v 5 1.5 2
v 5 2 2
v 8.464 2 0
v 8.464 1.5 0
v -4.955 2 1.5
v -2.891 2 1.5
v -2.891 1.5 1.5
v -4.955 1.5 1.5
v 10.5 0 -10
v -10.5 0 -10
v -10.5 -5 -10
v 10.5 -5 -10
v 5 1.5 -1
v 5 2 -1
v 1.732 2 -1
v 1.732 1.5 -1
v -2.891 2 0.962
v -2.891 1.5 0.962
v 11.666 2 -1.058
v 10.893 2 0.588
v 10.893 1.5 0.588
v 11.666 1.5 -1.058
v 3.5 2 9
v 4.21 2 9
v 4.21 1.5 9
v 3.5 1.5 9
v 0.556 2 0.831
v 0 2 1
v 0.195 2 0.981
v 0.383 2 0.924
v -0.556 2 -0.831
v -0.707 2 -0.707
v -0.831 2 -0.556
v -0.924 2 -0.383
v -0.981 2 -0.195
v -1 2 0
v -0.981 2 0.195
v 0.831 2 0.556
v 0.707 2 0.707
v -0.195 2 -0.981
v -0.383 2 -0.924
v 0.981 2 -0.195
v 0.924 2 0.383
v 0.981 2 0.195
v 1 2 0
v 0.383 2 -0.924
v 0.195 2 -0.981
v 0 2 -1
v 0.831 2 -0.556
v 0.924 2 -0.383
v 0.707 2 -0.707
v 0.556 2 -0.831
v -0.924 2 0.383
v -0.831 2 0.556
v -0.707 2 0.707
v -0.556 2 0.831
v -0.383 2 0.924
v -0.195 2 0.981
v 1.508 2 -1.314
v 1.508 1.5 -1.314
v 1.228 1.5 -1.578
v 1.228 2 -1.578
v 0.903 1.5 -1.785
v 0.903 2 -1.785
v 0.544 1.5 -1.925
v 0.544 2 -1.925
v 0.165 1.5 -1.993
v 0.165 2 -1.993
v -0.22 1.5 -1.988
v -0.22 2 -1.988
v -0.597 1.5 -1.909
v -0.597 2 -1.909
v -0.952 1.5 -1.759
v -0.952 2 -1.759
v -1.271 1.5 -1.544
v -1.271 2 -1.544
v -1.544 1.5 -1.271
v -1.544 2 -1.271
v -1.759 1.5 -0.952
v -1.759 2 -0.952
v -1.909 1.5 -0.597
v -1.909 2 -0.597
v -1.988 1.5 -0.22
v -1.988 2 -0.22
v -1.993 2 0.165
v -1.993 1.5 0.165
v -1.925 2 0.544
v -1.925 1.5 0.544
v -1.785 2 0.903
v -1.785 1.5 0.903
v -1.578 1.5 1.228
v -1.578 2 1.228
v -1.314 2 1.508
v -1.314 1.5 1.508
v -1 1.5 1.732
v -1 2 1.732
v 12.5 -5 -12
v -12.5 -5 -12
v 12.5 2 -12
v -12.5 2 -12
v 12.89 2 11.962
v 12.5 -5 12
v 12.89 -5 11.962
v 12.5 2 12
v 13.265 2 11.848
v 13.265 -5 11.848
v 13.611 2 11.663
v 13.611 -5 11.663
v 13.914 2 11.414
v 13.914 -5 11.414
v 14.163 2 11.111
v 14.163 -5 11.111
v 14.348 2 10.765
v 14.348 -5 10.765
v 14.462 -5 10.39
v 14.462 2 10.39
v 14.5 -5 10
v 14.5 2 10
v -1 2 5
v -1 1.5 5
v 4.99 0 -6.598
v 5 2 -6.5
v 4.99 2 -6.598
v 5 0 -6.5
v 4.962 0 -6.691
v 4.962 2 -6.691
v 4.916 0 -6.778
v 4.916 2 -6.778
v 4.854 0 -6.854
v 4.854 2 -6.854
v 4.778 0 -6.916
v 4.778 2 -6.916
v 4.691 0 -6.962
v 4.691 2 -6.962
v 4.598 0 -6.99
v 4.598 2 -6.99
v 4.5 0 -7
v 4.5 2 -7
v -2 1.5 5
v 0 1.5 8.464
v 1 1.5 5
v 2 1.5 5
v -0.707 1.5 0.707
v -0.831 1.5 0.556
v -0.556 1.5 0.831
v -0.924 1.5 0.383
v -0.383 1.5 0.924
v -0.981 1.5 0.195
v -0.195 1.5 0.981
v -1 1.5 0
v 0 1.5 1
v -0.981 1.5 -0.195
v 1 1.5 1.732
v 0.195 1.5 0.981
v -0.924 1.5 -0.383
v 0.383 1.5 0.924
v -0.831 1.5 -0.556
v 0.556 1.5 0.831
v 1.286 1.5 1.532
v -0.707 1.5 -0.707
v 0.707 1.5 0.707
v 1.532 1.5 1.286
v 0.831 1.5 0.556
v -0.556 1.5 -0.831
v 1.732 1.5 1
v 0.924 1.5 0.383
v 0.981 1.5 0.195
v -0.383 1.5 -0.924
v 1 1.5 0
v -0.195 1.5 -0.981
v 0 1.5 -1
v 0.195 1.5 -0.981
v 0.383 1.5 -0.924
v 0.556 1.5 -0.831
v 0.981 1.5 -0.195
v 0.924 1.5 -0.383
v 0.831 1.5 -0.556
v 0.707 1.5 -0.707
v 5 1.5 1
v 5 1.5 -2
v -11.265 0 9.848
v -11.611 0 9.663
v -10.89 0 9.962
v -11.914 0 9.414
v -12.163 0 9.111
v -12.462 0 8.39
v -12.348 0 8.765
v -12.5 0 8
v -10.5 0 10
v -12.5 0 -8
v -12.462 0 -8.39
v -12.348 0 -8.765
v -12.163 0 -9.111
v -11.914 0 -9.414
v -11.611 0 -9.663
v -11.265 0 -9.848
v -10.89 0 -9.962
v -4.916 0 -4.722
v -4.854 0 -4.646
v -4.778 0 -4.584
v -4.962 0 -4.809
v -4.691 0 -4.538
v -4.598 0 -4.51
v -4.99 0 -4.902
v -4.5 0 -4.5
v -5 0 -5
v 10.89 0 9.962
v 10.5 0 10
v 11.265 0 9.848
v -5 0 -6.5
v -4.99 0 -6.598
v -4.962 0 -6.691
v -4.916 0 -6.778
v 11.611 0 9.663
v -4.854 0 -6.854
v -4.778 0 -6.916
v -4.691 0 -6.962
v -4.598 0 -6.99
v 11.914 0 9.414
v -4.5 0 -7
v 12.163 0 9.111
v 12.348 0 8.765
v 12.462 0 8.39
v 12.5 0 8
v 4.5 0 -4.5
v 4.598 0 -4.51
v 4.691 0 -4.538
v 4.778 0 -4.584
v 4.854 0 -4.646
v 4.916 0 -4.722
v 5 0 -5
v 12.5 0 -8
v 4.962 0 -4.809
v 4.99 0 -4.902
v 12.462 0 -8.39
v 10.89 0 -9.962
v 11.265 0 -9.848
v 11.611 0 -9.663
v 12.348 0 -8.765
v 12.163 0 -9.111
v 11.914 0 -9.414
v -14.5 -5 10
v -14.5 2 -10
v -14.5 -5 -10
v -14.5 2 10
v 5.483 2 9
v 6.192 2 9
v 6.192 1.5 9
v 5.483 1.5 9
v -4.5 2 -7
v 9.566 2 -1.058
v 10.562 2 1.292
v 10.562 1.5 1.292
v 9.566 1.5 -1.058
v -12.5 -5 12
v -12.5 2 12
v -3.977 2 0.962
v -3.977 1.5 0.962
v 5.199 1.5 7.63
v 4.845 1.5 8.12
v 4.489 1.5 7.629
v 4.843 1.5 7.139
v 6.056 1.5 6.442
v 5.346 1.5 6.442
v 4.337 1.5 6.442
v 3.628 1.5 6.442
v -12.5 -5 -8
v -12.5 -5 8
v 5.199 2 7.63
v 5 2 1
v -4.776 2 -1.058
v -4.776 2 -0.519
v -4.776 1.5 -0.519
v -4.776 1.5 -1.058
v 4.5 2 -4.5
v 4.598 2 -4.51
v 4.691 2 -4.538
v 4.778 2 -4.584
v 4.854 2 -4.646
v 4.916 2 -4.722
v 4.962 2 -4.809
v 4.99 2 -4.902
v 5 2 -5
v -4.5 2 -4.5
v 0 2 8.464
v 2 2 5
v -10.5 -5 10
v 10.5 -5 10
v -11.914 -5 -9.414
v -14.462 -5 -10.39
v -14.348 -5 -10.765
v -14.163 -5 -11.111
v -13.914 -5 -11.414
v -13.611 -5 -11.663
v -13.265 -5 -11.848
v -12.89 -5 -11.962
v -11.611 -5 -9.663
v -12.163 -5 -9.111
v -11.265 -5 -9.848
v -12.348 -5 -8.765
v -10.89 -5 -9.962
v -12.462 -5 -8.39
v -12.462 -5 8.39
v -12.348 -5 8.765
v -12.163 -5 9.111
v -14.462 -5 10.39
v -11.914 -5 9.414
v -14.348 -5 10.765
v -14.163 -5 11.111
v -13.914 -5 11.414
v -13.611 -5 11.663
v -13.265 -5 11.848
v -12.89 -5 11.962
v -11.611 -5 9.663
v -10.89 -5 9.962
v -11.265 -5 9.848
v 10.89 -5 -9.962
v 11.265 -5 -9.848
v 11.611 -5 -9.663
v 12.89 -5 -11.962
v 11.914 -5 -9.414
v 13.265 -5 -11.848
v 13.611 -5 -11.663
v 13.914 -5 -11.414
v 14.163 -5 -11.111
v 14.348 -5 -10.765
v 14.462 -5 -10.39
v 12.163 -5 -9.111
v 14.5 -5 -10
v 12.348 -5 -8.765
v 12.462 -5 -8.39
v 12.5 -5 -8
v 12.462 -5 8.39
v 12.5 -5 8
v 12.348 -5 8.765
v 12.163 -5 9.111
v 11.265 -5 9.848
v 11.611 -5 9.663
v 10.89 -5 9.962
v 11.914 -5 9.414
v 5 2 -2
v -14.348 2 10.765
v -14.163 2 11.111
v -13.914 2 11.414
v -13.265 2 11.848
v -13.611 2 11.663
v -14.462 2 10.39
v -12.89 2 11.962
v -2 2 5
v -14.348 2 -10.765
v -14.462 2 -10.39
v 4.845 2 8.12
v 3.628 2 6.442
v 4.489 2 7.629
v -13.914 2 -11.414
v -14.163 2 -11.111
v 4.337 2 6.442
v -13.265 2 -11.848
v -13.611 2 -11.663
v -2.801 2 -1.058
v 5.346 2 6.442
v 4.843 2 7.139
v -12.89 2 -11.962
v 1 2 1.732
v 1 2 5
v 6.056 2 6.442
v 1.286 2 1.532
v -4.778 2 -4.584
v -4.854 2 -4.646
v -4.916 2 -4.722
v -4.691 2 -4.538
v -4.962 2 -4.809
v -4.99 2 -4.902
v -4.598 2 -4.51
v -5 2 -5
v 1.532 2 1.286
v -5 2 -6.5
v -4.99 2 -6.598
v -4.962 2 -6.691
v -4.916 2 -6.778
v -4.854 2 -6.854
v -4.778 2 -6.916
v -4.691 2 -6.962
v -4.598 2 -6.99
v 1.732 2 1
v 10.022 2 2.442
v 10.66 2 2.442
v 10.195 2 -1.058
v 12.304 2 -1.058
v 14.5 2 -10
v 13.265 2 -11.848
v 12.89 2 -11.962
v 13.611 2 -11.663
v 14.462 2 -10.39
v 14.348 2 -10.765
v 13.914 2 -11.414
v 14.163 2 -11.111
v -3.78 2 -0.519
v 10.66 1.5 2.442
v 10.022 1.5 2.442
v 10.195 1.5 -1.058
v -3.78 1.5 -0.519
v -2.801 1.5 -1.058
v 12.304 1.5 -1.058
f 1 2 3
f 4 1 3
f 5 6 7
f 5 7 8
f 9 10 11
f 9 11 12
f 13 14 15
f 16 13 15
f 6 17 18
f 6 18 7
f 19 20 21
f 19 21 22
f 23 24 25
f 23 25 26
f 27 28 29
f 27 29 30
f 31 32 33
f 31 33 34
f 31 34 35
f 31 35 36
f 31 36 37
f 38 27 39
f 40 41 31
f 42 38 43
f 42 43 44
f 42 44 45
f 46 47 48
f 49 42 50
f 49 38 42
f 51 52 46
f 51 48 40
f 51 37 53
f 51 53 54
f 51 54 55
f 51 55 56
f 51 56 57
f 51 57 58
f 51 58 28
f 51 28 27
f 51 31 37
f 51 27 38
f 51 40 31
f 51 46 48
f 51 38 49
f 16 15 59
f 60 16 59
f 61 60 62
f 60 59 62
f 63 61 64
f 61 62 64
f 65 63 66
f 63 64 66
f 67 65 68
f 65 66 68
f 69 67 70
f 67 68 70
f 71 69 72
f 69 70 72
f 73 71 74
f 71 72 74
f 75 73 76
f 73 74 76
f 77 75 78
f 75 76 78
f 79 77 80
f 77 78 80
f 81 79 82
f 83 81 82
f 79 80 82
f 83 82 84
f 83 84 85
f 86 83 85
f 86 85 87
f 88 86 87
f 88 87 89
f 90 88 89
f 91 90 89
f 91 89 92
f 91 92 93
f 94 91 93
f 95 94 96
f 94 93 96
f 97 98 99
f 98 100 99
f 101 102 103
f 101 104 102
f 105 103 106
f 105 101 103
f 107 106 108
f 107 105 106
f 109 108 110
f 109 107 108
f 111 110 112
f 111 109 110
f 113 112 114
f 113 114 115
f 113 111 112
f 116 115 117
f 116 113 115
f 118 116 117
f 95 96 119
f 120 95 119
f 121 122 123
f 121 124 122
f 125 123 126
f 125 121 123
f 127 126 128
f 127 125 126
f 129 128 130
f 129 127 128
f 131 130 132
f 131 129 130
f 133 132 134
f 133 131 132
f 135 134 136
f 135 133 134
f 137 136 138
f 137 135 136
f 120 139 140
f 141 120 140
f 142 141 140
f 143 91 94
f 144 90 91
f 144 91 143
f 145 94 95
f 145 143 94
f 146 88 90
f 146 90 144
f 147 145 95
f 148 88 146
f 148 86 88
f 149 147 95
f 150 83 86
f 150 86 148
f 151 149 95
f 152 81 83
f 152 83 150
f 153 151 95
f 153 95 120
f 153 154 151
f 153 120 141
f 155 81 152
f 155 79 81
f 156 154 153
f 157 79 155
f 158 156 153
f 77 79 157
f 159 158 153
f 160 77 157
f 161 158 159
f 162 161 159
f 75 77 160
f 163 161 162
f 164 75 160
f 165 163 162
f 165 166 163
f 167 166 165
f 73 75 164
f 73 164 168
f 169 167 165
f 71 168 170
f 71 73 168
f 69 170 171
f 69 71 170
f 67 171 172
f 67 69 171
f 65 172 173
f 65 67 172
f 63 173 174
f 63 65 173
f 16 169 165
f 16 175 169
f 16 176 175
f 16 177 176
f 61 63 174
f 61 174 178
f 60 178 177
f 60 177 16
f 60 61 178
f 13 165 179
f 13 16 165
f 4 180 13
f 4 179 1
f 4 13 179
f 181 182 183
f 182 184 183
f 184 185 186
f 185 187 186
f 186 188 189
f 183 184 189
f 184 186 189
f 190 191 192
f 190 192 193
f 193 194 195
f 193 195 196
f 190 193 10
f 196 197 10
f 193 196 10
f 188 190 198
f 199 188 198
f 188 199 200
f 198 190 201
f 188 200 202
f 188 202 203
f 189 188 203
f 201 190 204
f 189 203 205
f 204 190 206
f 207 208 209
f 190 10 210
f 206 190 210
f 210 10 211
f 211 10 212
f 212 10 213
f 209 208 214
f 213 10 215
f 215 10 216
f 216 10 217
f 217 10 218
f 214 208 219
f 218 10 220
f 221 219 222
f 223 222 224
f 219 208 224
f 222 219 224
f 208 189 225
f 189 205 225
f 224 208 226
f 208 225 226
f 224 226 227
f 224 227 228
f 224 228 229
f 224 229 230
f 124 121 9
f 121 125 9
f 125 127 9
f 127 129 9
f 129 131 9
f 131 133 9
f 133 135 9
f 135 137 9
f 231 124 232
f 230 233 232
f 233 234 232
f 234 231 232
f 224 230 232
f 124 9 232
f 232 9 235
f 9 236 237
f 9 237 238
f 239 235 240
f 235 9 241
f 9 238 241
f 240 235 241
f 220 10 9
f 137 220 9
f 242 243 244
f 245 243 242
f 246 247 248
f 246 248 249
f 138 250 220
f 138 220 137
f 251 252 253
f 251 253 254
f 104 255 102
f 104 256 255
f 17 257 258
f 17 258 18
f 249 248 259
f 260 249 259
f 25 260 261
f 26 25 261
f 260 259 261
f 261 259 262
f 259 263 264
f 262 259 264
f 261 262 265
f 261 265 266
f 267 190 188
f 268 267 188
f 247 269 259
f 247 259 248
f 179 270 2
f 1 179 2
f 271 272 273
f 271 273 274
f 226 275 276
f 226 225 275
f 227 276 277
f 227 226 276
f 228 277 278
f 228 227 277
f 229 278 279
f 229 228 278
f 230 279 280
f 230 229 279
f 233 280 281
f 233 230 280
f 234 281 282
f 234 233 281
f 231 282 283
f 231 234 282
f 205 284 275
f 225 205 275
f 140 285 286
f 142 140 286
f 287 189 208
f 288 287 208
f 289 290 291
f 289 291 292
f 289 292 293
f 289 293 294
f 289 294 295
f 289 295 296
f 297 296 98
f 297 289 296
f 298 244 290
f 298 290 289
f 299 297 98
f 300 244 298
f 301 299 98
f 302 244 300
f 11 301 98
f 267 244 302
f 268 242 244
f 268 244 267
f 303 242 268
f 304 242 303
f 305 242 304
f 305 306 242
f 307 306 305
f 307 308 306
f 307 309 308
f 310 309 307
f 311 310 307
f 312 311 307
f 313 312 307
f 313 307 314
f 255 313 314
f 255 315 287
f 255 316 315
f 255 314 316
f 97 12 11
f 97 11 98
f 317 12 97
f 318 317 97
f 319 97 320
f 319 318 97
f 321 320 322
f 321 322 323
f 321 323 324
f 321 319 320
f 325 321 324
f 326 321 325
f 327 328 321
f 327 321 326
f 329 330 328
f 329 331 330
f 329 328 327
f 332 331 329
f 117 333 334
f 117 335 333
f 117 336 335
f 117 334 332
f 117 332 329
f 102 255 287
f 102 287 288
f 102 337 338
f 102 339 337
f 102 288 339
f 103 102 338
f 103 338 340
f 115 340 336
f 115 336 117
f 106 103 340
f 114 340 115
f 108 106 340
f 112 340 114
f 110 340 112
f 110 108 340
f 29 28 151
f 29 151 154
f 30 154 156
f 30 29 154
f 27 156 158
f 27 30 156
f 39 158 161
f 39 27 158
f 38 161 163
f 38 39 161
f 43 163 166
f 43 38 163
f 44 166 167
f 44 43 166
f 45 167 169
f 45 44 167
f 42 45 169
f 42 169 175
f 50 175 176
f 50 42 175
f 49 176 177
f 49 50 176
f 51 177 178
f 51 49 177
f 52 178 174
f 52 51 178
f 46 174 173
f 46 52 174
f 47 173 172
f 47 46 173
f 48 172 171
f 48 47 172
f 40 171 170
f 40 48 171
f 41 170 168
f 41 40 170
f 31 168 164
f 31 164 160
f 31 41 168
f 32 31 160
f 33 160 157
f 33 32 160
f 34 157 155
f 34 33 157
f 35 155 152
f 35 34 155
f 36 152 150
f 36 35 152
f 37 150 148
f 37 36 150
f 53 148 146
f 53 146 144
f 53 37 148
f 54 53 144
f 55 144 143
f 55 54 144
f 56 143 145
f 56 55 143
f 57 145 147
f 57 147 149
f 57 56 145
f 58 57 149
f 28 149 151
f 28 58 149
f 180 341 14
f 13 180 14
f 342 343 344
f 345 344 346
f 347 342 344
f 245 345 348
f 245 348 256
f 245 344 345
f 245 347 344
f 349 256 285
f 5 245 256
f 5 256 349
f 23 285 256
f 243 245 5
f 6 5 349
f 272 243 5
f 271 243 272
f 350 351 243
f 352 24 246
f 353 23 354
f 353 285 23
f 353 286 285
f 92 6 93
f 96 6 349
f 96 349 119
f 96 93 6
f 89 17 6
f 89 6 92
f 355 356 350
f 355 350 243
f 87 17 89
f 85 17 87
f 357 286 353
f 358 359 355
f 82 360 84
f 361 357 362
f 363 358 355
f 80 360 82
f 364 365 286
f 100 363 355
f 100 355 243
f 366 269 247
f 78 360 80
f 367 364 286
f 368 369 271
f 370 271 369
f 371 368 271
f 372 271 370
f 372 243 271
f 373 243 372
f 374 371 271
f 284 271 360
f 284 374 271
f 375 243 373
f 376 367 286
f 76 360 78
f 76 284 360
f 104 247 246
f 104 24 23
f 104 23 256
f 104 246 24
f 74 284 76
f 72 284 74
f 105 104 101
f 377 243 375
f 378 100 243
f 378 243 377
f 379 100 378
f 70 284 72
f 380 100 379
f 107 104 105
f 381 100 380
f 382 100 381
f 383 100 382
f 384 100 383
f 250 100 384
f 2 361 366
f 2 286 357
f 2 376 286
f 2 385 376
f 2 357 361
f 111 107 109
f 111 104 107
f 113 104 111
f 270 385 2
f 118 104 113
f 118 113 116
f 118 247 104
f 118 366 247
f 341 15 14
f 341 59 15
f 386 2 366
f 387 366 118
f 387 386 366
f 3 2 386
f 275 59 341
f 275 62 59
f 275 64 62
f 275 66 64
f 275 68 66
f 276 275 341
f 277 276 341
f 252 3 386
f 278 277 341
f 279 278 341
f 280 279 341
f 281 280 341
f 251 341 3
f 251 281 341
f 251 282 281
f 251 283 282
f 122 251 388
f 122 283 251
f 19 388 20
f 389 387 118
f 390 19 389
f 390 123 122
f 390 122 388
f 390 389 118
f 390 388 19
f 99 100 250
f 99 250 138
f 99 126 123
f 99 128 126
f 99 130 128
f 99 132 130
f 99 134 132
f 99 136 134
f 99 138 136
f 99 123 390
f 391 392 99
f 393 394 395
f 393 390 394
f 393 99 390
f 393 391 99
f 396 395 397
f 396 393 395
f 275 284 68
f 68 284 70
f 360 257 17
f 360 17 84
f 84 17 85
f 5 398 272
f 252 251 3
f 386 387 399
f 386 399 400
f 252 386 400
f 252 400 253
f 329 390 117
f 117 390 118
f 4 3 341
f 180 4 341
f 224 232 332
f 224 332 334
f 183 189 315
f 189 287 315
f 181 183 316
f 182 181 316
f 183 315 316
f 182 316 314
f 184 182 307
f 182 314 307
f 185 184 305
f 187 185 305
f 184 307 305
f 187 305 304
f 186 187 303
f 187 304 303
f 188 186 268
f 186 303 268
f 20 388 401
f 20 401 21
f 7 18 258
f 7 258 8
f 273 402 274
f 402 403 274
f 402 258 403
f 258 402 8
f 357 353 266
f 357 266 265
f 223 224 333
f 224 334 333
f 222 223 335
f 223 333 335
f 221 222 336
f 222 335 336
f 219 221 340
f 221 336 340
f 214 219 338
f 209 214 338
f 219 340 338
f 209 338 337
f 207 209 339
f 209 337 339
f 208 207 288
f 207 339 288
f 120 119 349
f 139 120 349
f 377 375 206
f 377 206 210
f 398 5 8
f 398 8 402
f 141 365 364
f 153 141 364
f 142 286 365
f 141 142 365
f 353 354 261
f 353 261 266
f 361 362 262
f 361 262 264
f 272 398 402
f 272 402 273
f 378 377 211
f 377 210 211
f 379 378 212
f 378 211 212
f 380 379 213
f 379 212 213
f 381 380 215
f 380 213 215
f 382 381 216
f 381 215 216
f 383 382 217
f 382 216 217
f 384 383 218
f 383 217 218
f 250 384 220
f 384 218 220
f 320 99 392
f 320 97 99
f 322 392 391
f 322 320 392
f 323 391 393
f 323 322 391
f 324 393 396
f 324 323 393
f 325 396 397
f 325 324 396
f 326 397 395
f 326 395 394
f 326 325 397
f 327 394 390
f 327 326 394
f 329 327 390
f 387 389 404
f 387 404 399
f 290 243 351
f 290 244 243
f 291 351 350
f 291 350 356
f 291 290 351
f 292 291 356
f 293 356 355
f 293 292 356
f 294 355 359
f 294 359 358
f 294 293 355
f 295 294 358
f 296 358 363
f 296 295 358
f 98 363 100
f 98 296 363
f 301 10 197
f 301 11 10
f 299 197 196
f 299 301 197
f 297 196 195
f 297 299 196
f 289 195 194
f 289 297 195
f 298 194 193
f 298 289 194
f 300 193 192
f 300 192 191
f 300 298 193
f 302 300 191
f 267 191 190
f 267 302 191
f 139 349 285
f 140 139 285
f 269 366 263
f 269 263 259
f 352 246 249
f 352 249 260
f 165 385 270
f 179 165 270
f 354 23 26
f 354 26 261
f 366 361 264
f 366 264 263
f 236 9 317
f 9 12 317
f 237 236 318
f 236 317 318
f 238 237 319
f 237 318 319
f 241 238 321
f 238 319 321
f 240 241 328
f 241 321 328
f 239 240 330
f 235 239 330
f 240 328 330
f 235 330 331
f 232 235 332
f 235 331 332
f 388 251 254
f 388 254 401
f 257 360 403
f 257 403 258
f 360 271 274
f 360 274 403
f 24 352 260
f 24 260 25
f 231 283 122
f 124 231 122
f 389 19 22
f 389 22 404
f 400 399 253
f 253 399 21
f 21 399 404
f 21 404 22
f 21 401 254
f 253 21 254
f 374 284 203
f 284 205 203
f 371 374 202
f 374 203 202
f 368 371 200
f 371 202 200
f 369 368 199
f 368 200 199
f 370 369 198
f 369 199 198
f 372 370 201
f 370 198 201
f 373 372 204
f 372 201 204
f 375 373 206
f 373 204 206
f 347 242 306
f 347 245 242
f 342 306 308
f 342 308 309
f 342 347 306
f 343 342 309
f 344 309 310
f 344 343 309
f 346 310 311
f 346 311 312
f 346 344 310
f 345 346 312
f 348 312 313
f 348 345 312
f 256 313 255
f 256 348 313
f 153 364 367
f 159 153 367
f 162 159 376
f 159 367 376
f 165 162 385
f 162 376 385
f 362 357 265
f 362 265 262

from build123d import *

# Parameters (mm, degrees)
SKETCH1_W           = 29
SKETCH1_H           = 24
BOSS_EXTRUDE1_DEPTH = 2
SKETCH2_W           = 29
SKETCH2_H           = 24
SKETCH2_W_2         = 25
SKETCH2_H_2         = 20
BOSS_EXTRUDE2_DEPTH = 5
SKETCH3_W           = 10
SKETCH3_H           = 2.5
CUT_EXTRUDE1_DEPTH  = 2
SKETCH7_R           = 1
CUT_EXTRUDE2_DEPTH  = 0.5
CUT_EXTRUDE4_DEPTH  = 0.5
FILLET3_R           = 2
FILLET4_R           = 0.5


with BuildPart() as part:
    # Sketch1 → Boss-Extrude1 (new body)
    with BuildSketch(Plane(origin=(0, 0, 0), x_dir=(1, 0, 0), z_dir=(0, 1, 0))):
        Rectangle(SKETCH1_W, SKETCH1_H)
    extrude(amount=BOSS_EXTRUDE1_DEPTH)

    # Sketch2 → Boss-Extrude2 (add)
    with BuildSketch(Plane.XZ):
        Rectangle(SKETCH2_W, SKETCH2_H)
        Rectangle(SKETCH2_W_2, SKETCH2_H_2, mode=Mode.SUBTRACT)
    extrude(amount=BOSS_EXTRUDE2_DEPTH)

    # Sketch3 → Cut-Extrude1 (cut)
    with BuildSketch(Plane(origin=(0, 2, 0), x_dir=(1, 0, 0), z_dir=(0, 1, 0))):
        with Locations((0, 5.75)):
            Rectangle(SKETCH3_W, SKETCH3_H)
    extrude(amount=-CUT_EXTRUDE1_DEPTH, mode=Mode.SUBTRACT)

    # Sketch7 → Cut-Extrude2 (cut)
    with BuildSketch(Plane(origin=(0, 2, 0), x_dir=(1, 0, 0), z_dir=(0, 1, 0))):
        with BuildLine():
            Line((5, -2), (8.464101615, 0))
            Line((8.464101615, 0), (5, 2))
            Line((5, 2), (5, 1))
            Line((5, 1), (1.732050808, 1))
            ThreePointArc((1.732050808, 1), (-1.414213562, 1.414213562), (-1, -1.732050808))
            Line((-1, -1.732050808), (-1, -5))
            Line((-1, -5), (-2, -5))
            Line((-2, -5), (0, -8.464101615))
            Line((0, -8.464101615), (2, -5))
            Line((2, -5), (1, -5))
            Line((1, -5), (1, -1.732050808))
            ThreePointArc((1, -1.732050808), (1.414213562, -1.414213562), (1.732050808, -1))
            Line((1.732050808, -1), (5, -1))
            Line((5, -1), (5, -2))
        make_face()
        with Locations(Location((0, 0, 0), (0, 0, 270))):
            Circle(SKETCH7_R, mode=Mode.SUBTRACT)
    extrude(amount=-CUT_EXTRUDE2_DEPTH, mode=Mode.SUBTRACT)

    # Sketch10 → Cut-Extrude4 (cut)
    with BuildSketch(Plane(origin=(0, 2, 0), x_dir=(1, 0, 0), z_dir=(0, 1, 0))):
        Polygon((9.565905449, 1.057692308), (10.194811699, 1.057692308), (10.893129006, -0.587840545), (11.665765224, 1.057692308), (12.304487179, 1.057692308), (10.660356571, -2.442307692), (10.021634615, -2.442307692), (10.562199519, -1.291766827), align=None)
        Polygon((3.628305288, -6.442307692), (4.337139423, -6.442307692), (4.842648237, -7.139222756), (5.346053686, -6.442307692), (6.056290064, -6.442307692), (5.198818109, -7.630008013), (6.192307692, -9), (5.483473558, -9), (4.844751603, -8.120092147), (4.209535256, -9), (3.5, -9), (4.489282853, -7.629306891), align=None)
        Polygon((-4.775641026, 1.057692308), (-2.801282051, 1.057692308), (-3.977063301, -0.961538462), (-2.891025641, -0.961538462), (-2.891025641, -1.5), (-4.955128205, -1.5), (-3.780048077, 0.519230769), (-4.775641026, 0.519230769), align=None)
    extrude(amount=-CUT_EXTRUDE4_DEPTH, mode=Mode.SUBTRACT)

    # Fillet3
    fillet3_edges = [part.edges().sort_by_distance(p)[0] for p in [
        (12.5, -2.5, 10),
        (-12.5, -2.5, 10),
        (-12.5, -2.5, -10),
        (12.5, -2.5, -10),
        (14.5, -1.5, 12),
        (-14.5, -1.5, 12),
        (-14.5, -1.5, -12),
        (14.5, -1.5, -12),
    ]]
    fillet(fillet3_edges, radius=FILLET3_R)

    # Fillet4
    fillet4_edges = [part.edges().sort_by_distance(p)[0] for p in [
        (5, 1, -4.5),
        (5, 1, -7),
        (-5, 1, -7),
        (-5, 1, -4.5),
    ]]
    fillet(fillet4_edges, radius=FILLET4_R)


solid = part.part
